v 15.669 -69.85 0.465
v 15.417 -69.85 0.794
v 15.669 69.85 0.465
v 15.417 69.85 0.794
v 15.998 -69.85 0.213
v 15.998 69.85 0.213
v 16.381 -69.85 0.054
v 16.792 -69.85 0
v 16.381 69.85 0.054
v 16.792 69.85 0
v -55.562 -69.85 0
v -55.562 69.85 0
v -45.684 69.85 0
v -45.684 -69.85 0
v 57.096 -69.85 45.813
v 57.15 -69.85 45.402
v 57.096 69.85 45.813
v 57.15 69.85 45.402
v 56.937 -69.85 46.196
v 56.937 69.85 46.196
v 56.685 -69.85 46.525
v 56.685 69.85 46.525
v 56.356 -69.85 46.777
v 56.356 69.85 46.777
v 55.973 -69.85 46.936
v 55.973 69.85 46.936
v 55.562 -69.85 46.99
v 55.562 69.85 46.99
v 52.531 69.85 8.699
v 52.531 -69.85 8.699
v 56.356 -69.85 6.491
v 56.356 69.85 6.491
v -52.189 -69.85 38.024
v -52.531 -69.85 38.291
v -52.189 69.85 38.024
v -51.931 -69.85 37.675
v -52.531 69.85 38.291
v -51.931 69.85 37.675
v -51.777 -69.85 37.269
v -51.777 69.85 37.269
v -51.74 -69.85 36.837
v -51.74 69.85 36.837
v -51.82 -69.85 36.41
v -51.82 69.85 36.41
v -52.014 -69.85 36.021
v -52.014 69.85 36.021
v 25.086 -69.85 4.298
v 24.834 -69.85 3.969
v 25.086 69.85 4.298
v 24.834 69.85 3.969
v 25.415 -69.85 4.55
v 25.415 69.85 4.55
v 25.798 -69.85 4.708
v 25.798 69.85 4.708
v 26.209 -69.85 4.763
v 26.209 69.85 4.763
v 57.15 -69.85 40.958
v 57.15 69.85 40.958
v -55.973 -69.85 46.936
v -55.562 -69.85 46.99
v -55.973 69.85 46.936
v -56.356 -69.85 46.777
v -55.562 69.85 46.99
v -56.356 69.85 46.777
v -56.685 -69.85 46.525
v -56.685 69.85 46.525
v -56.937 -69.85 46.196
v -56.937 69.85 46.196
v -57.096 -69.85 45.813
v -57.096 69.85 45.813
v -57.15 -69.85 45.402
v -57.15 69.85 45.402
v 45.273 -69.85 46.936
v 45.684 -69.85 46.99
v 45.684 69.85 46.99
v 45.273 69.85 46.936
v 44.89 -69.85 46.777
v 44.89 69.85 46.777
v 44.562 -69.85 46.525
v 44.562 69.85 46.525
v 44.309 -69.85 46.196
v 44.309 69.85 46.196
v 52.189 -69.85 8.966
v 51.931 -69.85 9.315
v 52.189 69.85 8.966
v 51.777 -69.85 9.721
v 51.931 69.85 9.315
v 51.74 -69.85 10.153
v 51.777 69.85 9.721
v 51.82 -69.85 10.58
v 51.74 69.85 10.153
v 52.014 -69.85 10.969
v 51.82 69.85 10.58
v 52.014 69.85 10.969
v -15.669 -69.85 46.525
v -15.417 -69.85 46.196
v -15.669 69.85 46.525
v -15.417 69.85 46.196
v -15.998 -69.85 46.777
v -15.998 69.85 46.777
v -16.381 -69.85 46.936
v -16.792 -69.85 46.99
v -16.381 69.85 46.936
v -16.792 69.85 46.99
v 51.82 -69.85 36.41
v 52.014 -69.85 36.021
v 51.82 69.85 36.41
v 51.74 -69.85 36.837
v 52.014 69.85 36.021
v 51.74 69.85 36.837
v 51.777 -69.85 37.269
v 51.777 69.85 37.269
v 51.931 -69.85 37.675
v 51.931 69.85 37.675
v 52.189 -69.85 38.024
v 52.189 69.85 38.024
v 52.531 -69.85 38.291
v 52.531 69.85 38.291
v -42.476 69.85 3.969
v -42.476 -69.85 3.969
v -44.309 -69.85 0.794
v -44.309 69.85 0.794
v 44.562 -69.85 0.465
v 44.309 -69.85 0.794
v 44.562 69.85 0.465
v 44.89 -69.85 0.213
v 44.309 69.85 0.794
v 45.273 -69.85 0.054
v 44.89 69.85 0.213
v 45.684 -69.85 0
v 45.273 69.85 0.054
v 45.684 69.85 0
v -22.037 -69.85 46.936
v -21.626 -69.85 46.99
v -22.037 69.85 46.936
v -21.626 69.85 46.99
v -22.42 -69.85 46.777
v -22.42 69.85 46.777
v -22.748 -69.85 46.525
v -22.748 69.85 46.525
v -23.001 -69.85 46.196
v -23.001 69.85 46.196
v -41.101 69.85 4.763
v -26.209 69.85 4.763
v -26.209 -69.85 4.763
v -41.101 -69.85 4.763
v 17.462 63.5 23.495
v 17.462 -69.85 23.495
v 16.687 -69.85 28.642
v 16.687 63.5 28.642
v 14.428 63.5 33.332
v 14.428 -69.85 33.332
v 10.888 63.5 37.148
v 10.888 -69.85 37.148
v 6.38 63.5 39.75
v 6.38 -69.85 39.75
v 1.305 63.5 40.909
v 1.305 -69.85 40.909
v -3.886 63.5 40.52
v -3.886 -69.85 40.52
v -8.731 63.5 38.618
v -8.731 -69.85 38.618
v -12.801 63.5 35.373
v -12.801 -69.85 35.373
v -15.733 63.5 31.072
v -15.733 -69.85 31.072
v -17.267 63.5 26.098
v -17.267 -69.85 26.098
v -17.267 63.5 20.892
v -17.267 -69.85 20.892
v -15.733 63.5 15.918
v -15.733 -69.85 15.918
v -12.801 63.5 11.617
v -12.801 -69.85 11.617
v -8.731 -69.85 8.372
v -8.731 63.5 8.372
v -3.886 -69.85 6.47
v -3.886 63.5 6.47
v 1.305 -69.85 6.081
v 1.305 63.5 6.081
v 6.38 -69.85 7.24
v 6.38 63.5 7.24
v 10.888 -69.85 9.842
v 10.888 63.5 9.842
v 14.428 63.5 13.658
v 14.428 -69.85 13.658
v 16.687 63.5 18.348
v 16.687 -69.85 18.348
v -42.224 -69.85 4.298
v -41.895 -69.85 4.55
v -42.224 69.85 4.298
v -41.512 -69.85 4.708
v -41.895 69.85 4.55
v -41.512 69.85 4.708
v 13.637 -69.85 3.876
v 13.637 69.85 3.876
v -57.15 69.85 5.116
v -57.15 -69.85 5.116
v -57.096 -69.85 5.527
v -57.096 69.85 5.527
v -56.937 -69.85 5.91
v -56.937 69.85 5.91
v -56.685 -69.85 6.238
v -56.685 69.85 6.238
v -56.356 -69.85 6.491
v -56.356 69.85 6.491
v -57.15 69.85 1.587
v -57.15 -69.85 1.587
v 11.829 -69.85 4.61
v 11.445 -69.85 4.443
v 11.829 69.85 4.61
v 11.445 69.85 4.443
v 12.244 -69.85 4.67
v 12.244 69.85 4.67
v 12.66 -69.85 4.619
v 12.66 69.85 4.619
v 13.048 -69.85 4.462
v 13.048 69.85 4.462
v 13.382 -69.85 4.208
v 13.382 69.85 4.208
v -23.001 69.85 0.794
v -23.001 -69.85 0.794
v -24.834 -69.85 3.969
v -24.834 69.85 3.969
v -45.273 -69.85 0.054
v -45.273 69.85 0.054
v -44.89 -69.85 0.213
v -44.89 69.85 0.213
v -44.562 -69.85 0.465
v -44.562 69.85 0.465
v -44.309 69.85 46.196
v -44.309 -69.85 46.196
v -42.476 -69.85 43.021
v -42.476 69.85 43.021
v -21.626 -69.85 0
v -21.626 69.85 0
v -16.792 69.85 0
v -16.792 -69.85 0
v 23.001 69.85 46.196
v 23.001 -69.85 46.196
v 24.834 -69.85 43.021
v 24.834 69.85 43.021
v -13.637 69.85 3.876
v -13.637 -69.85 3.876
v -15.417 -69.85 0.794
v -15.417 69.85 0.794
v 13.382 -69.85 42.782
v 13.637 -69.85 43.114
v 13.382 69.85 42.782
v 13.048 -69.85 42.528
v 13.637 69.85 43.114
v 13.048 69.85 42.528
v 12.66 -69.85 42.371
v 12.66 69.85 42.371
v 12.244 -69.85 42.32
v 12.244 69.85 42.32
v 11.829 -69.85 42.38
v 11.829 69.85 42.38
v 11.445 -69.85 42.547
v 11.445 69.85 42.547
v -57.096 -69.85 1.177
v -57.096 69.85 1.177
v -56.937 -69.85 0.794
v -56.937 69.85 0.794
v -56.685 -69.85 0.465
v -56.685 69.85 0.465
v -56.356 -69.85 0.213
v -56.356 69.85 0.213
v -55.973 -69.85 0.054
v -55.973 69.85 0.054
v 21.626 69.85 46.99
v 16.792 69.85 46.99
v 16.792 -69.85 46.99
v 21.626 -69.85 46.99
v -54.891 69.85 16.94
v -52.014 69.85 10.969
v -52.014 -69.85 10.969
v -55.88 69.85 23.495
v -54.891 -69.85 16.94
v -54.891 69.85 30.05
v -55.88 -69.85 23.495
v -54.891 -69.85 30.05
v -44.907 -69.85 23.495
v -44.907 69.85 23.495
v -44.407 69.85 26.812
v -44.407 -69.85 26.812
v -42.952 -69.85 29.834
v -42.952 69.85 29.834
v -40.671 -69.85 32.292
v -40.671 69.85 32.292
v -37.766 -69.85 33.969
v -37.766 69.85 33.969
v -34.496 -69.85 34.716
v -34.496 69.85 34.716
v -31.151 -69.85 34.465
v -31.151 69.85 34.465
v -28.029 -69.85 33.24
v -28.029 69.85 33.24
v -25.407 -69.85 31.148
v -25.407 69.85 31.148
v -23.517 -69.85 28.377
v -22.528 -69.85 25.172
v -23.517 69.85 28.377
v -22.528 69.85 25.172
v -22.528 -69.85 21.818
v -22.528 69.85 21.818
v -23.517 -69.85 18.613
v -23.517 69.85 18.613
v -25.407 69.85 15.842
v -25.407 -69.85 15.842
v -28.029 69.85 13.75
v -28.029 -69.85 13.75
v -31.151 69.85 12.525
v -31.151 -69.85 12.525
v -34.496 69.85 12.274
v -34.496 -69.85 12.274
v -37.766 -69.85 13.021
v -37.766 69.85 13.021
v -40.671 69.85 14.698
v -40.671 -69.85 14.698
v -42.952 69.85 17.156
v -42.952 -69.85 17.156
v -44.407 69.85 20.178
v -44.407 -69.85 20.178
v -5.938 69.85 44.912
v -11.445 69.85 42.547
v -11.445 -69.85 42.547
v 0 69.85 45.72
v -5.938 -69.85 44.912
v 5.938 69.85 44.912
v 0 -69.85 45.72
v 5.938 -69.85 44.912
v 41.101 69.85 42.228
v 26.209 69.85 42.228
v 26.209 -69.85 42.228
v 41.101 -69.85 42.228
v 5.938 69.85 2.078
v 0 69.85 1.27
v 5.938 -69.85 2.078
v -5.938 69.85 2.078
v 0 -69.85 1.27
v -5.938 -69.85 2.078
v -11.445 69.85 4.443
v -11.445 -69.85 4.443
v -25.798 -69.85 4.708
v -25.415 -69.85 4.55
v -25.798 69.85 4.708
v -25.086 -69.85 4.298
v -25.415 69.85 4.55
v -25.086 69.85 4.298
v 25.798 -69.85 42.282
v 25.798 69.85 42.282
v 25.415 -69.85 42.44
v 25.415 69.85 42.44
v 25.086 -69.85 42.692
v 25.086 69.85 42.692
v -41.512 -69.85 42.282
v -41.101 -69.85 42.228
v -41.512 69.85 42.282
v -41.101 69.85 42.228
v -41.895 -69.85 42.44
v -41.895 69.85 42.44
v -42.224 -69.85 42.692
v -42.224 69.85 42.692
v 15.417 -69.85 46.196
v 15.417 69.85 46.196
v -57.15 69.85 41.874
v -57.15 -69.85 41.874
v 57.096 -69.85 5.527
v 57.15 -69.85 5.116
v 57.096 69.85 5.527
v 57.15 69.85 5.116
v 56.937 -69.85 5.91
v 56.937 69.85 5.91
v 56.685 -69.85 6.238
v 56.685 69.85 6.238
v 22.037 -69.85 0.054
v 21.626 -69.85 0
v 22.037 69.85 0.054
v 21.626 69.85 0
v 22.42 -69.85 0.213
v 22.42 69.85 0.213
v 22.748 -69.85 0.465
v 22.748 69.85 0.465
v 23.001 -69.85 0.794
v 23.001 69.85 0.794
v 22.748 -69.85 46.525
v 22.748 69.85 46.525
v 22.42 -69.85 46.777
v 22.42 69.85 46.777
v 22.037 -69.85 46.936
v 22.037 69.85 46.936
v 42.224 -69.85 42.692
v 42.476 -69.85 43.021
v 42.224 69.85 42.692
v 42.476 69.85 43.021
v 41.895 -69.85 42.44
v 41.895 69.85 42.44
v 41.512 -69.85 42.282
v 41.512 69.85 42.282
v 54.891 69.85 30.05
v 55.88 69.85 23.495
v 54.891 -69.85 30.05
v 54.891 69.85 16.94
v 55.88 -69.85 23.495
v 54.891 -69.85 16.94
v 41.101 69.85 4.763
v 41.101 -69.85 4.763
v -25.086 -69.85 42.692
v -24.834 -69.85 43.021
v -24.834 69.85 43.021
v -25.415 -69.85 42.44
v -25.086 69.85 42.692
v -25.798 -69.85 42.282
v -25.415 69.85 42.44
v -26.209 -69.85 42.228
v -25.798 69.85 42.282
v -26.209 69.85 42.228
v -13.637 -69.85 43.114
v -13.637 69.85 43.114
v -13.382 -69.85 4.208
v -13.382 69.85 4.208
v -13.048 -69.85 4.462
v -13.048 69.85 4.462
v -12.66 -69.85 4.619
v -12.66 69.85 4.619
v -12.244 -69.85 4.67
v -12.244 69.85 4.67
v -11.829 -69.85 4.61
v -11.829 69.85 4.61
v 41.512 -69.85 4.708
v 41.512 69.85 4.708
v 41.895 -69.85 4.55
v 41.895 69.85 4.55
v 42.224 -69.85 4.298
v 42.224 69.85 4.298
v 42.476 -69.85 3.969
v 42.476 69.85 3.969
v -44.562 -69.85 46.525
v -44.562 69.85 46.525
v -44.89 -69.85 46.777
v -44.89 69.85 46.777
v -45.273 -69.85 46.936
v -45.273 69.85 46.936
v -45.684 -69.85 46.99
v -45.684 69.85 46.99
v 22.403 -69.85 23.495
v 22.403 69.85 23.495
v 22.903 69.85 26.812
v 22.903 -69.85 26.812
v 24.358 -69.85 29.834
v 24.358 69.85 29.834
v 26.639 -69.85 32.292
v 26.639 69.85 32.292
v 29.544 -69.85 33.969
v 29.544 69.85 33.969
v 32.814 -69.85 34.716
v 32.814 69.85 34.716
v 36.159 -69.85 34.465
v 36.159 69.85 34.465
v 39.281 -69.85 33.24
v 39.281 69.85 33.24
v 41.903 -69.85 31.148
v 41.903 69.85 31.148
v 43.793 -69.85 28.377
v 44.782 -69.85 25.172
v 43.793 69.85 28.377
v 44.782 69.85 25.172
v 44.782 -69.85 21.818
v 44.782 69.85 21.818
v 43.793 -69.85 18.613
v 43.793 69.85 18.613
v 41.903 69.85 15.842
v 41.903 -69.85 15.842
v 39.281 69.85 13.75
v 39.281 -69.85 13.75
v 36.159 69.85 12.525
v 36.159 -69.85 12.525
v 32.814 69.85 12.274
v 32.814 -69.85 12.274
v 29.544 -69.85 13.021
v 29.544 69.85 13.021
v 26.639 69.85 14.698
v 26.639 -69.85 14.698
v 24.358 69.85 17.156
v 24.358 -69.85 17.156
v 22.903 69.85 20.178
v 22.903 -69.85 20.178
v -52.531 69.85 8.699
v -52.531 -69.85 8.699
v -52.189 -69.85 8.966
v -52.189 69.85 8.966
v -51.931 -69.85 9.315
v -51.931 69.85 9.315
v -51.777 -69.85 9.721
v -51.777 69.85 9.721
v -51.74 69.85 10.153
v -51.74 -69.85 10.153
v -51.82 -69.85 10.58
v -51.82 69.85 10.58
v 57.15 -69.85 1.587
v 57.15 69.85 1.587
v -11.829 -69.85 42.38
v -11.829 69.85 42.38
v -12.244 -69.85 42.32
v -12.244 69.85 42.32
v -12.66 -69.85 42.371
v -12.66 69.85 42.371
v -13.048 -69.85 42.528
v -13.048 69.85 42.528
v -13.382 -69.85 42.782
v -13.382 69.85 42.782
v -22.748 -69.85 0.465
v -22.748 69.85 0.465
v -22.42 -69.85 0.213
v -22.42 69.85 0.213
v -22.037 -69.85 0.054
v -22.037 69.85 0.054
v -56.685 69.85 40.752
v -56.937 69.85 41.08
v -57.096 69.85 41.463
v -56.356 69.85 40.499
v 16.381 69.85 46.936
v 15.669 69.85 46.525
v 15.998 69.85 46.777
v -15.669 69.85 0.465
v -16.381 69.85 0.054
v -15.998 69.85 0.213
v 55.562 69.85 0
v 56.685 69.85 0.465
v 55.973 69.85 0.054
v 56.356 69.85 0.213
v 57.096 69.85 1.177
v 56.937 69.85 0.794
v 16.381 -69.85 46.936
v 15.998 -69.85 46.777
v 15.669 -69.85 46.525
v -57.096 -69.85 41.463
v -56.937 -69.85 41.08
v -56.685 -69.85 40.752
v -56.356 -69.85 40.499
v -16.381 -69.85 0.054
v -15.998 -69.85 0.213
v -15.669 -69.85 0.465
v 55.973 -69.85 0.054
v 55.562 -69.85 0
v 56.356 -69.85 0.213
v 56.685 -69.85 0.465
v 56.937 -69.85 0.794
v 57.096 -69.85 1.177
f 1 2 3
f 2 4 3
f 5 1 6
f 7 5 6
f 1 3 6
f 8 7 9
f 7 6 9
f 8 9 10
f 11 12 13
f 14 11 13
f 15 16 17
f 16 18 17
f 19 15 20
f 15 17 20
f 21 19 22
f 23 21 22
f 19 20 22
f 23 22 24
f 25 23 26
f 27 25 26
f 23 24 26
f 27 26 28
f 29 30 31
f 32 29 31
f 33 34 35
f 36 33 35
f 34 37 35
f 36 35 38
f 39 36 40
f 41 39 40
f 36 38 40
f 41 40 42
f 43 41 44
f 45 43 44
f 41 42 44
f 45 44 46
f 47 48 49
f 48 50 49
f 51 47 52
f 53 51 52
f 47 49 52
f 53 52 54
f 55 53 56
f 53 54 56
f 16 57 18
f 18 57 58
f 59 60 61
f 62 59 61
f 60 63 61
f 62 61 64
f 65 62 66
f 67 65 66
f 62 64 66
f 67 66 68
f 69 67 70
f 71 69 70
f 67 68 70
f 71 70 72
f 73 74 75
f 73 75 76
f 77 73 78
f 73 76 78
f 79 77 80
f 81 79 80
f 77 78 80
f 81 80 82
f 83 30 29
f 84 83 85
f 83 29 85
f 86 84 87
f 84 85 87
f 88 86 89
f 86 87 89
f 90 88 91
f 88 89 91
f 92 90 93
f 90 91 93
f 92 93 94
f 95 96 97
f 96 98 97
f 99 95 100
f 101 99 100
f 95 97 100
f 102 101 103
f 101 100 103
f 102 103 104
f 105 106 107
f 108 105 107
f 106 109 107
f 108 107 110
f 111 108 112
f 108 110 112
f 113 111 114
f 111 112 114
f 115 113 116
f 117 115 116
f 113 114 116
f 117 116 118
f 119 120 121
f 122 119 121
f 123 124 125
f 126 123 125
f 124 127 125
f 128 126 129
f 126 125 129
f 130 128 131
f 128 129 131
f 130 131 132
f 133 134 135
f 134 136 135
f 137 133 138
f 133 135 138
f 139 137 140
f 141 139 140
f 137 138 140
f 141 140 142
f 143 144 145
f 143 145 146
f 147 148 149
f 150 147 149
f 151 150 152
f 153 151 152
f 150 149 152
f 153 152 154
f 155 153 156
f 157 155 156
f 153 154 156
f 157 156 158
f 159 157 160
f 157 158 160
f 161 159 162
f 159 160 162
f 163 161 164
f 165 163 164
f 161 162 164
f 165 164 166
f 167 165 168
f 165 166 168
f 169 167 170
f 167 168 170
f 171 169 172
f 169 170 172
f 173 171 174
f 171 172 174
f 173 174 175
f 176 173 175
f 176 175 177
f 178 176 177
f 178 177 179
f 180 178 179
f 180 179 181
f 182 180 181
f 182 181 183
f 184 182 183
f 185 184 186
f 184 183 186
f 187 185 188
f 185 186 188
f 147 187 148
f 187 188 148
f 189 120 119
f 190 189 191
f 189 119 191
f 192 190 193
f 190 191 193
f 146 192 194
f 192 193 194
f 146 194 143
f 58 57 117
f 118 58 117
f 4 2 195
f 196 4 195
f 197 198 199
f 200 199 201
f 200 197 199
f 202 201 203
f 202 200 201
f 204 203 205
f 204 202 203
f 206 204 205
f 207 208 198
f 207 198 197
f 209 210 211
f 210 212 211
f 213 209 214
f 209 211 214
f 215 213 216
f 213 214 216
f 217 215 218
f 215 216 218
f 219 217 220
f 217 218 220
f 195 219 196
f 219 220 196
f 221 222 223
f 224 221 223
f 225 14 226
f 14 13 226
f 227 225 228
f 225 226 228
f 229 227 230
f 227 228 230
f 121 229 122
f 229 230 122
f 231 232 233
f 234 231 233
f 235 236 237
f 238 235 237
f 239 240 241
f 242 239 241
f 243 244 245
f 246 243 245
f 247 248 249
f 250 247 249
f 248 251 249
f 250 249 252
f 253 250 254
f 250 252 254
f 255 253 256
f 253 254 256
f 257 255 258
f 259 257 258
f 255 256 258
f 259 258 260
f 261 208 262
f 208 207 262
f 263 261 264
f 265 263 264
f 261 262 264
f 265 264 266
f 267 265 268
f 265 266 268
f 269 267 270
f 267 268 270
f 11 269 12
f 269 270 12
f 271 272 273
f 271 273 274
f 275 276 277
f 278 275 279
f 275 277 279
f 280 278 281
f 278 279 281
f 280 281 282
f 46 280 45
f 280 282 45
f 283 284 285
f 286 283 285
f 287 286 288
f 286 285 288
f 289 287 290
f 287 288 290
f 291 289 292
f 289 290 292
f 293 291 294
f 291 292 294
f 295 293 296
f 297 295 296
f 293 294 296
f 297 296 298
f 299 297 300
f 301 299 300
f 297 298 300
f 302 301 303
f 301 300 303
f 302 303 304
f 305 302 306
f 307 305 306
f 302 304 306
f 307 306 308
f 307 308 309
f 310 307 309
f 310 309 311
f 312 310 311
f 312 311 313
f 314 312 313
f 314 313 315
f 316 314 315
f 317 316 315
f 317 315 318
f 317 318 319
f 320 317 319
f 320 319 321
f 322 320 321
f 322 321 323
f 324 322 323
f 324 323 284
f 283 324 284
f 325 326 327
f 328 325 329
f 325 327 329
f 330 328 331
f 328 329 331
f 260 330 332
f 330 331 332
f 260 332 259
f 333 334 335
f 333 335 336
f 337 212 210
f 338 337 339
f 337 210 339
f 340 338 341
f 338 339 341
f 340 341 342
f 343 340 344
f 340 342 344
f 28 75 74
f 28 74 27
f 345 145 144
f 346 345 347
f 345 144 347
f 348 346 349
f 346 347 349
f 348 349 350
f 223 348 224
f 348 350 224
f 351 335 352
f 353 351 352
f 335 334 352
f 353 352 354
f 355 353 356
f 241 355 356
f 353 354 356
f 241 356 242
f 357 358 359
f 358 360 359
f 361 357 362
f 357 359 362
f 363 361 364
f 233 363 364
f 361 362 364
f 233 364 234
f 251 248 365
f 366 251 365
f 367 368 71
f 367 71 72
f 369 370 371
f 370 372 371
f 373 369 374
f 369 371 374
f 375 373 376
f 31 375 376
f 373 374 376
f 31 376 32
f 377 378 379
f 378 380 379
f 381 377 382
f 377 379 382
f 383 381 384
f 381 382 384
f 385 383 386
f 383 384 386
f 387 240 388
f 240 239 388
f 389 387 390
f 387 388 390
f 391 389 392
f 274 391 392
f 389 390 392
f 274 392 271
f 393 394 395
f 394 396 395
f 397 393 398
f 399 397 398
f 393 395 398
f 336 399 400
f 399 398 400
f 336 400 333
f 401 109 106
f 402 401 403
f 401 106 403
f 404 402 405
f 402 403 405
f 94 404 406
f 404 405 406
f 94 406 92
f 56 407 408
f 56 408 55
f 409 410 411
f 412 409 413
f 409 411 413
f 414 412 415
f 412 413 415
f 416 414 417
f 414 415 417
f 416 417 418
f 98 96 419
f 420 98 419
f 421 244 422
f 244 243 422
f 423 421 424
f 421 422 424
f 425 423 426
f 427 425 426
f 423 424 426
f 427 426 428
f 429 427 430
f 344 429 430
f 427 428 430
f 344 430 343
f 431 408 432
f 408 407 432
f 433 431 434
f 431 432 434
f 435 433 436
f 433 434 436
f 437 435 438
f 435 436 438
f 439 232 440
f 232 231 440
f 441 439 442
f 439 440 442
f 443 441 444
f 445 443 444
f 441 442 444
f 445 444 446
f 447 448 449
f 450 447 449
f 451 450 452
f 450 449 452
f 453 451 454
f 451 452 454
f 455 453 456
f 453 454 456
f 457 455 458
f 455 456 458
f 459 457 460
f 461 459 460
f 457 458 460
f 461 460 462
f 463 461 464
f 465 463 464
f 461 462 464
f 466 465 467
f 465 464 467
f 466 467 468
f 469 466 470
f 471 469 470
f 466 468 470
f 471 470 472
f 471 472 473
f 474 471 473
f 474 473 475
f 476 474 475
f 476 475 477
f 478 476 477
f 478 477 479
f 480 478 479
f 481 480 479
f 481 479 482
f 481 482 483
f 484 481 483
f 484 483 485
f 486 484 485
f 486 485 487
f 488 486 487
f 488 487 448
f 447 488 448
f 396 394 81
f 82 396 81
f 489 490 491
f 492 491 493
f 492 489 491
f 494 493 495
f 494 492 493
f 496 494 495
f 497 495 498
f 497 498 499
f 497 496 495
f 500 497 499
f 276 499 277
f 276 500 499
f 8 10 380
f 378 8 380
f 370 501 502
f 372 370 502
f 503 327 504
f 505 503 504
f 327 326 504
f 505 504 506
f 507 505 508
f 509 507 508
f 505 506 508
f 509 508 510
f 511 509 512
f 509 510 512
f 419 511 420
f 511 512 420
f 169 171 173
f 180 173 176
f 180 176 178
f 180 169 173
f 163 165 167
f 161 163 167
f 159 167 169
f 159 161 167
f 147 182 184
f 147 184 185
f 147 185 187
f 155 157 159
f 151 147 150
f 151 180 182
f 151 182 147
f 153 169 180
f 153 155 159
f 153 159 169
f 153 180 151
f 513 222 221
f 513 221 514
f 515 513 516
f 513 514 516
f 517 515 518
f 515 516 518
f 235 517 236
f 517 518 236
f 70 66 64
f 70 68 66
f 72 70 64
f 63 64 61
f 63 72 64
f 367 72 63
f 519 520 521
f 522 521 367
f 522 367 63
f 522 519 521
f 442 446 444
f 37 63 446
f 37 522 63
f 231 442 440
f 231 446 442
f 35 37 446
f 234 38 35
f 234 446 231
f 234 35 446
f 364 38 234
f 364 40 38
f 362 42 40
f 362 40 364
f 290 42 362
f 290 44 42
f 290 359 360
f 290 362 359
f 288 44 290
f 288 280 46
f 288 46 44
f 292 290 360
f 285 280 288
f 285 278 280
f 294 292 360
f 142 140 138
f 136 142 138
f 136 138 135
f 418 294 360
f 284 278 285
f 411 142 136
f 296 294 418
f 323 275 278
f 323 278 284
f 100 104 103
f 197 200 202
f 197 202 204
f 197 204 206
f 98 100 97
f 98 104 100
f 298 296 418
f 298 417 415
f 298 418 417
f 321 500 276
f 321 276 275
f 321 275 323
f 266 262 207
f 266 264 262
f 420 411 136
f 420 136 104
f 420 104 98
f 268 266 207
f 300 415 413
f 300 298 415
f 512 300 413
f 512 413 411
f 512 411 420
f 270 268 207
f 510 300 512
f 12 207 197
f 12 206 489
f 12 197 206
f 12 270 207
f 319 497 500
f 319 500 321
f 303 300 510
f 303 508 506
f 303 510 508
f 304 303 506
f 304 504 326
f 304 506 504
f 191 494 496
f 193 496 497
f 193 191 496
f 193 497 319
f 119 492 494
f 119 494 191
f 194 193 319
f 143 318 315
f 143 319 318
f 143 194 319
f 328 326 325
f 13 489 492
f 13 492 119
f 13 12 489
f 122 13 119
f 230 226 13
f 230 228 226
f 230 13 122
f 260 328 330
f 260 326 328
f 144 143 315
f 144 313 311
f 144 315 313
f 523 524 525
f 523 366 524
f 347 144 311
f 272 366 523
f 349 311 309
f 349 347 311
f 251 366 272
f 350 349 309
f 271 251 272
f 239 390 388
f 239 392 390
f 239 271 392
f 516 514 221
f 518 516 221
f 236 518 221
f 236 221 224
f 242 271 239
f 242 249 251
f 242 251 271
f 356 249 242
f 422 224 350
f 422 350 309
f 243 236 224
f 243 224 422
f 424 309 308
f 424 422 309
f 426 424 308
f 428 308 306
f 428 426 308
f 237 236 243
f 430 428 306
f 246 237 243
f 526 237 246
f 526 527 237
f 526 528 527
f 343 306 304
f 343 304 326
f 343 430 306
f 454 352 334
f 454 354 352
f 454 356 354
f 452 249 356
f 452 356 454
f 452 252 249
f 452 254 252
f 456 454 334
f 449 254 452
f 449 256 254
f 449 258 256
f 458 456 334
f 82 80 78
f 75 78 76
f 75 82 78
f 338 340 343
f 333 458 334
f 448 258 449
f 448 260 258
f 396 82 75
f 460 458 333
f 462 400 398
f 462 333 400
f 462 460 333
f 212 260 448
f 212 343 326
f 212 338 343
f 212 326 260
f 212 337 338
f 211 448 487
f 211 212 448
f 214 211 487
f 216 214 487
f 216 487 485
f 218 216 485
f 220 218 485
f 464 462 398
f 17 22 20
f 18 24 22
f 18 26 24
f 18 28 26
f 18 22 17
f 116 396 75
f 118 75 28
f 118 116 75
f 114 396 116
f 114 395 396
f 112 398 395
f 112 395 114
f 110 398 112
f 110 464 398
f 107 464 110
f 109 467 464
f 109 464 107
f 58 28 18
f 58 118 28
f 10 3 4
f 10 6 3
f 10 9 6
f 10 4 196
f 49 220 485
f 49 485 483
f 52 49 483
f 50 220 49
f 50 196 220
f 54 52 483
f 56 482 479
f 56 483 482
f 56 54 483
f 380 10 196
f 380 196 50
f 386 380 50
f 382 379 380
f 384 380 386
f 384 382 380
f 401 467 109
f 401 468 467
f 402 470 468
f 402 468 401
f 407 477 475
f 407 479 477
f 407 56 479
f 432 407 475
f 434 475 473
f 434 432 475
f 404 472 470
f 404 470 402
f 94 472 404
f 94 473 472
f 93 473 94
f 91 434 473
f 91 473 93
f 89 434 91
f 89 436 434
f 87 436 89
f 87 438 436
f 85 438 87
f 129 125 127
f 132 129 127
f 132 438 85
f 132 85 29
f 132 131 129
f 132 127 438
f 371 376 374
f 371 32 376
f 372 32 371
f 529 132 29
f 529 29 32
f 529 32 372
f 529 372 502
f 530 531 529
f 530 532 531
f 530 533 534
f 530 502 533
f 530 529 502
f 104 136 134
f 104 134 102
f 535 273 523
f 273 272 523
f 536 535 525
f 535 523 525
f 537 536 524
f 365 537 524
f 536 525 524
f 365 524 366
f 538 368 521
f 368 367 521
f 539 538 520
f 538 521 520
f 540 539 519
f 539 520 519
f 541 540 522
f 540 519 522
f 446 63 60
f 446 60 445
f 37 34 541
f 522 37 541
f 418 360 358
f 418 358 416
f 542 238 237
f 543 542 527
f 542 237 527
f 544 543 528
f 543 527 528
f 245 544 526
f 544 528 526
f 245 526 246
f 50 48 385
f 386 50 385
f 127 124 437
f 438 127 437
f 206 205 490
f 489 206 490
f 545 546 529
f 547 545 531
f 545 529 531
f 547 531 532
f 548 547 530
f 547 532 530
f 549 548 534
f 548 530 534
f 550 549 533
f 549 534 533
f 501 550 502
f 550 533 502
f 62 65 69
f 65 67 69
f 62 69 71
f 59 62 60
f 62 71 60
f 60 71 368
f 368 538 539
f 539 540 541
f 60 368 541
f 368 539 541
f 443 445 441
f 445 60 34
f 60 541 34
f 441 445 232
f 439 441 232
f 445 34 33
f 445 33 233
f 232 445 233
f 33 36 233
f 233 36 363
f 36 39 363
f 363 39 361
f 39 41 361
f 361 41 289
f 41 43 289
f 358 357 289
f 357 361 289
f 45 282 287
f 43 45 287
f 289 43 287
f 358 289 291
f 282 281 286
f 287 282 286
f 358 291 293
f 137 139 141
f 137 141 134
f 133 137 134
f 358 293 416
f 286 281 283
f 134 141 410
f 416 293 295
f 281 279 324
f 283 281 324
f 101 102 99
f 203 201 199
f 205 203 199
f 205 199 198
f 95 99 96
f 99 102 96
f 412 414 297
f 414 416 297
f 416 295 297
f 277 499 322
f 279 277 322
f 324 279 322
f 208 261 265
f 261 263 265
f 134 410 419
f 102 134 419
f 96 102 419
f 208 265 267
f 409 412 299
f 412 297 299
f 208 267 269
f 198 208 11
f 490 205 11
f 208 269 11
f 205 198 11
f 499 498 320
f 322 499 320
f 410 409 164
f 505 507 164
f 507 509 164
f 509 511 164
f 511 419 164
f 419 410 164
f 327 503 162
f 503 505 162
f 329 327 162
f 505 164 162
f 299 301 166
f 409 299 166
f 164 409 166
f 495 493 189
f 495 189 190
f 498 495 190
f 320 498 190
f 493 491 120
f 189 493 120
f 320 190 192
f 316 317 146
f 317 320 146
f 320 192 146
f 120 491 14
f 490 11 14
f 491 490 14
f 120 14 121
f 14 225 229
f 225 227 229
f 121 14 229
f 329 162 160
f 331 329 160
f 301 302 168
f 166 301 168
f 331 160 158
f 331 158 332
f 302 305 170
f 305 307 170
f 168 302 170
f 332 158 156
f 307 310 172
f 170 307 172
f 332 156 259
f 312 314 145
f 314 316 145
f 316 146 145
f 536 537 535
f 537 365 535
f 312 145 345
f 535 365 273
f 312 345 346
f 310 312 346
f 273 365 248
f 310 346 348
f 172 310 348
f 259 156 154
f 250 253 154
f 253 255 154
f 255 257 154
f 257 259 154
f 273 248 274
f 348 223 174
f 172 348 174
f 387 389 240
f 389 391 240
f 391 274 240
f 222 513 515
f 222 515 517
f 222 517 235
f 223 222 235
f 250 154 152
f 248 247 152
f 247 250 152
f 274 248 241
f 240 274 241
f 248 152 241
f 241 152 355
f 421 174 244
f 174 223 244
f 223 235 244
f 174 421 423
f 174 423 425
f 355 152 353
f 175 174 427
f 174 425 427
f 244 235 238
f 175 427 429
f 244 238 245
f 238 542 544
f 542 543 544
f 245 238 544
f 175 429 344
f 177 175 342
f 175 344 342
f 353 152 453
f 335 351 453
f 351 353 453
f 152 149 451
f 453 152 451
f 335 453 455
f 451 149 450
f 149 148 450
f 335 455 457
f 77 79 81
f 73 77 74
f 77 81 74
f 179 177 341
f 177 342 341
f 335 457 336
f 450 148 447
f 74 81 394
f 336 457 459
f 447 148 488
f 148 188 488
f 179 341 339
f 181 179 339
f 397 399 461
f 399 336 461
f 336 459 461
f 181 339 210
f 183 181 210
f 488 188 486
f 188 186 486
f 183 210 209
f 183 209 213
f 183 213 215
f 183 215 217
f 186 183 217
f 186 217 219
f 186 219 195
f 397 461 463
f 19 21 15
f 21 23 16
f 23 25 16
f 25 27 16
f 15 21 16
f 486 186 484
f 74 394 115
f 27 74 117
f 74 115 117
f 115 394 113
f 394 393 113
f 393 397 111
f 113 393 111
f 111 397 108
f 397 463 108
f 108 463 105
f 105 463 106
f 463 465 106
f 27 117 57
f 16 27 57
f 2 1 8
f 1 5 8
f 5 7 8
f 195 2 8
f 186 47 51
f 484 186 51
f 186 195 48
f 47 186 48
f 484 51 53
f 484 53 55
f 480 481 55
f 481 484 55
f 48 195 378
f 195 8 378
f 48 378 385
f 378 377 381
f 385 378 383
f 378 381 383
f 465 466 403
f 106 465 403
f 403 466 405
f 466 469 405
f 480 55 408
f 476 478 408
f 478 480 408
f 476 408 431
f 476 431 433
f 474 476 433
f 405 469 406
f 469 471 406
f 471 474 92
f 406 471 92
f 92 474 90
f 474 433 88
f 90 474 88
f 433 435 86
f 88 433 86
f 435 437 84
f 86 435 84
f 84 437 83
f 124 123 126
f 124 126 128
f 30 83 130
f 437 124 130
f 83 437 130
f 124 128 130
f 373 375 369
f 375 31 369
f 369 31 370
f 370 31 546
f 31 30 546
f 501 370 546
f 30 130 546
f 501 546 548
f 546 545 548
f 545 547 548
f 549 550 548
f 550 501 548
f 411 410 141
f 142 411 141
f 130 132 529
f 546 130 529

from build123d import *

# Parameters (mm, degrees)
F0_W     = 114.3
F0_H     = 139.7
F1_DEPTH = 46.99
F3_D     = 22.5044
F4_R     = 17.4625
F5_DEPTH = 133.35
F7_DEPTH = 139.701
F8_R     = 1.5875


with BuildPart() as f1:
    # F0 (on Top) → F1 (new body)
    with BuildSketch(Plane.XY):
        Rectangle(F0_W, F0_H)
    extrude(amount=F1_DEPTH)

    # F3 (through all)
    with Locations(Plane.XZ.offset(69.85)):
        with Locations((-33.655, 23.495), (33.655, 23.495)):
            Hole(F3_D / 2)

    # F4 (on face) → F5 (cut, through all)
    with BuildSketch(Plane.XZ.offset(69.85)):
        with Locations((0, 23.495)):
            Circle(F4_R)
    extrude(amount=-F5_DEPTH, mode=Mode.SUBTRACT)

    # F6 (on face) → F7 (cut, through all)
    with BuildSketch(Plane.XZ.offset(69.85)):
        with BuildLine():
            Line((-50.9913984587, 37.4018297423), (-57.15, 40.9575))
            Line((-57.15, 40.9575), (-57.15, 6.0325))
            Line((-57.15, 6.0325), (-50.9913984587, 9.5881702577))
            ThreePointArc((-50.9913984587, 9.5881702577), (-55.88, 23.495), (-50.9913984587, 37.4018297423))
        make_face()
        Polygon((-22.5425, 46.99), (-44.7675, 46.99), (-42.017869343, 42.2275), (-25.292130657, 42.2275), align=None)
        Polygon((-42.017869343, 4.7625), (-44.7675, 0), (-22.5425, 0), (-25.292130657, 4.7625), align=None)
        with BuildLine():
            Line((-12.800001213, 5.3260541322), (-15.875, 0))
            Line((-15.875, 0), (15.875, 0))
            Line((15.875, 0), (12.800001213, 5.3260541322))
            ThreePointArc((12.800001213, 5.3260541322), (0, 1.27), (-12.800001213, 5.3260541322))
        make_face()
        with BuildLine():
            Line((15.875, 46.99), (-15.875, 46.99))
            Line((-15.875, 46.99), (-12.800001213, 41.6639458678))
            ThreePointArc((-12.800001213, 41.6639458678), (0, 45.72), (12.800001213, 41.6639458678))
            Line((12.800001213, 41.6639458678), (15.875, 46.99))
        make_face()
        Polygon((44.7675, 46.99), (22.5425, 46.99), (25.292130657, 42.2275), (42.017869343, 42.2275), align=None)
        Polygon((25.292130657, 4.7625), (22.5425, 0), (44.7675, 0), (42.017869343, 4.7625), align=None)
        with BuildLine():
            Line((57.15, 6.0325), (57.15, 40.9575))
            Line((57.15, 40.9575), (50.9913984587, 37.4018297423))
            ThreePointArc((50.9913984587, 37.4018297423), (55.88, 23.495), (50.9913984587, 9.5881702577))
            Line((50.9913984587, 9.5881702577), (57.15, 6.0325))
        make_face()
    extrude(amount=-F7_DEPTH, mode=Mode.SUBTRACT)

    # F8
    f8_edges = [f1.edges().sort_by_distance(p)[0] for p in [
        (-57.15, 0, 0),
        (-44.7675, 0, 0),
        (-42.017869, 0, 4.7625),
        (-25.292131, 0, 4.7625),
        (-22.5425, 0, 0),
        (-15.875, 0, 0),
        (-12.800001, 0, 5.326054),
        (12.800001, 0, 5.326054),
        (15.875, 0, 0),
        (22.5425, 0, 0),
        (25.292131, 0, 4.7625),
        (42.017869, 0, 4.7625),
        (44.7675, 0, 0),
        (57.15, 0, 0),
        (57.15, 0, 6.0325),
        (50.991398, 0, 37.40183),
        (50.991398, 0, 9.58817),
        (57.15, 0, 46.99),
        (44.7675, 0, 46.99),
        (42.017869, 0, 42.2275),
        (25.292131, 0, 42.2275),
        (22.5425, 0, 46.99),
        (15.875, 0, 46.99),
        (12.800001, 0, 41.663946),
        (-12.800001, 0, 41.663946),
        (-15.875, 0, 46.99),
        (-22.5425, 0, 46.99),
        (-25.292131, 0, 42.2275),
        (-42.017869, 0, 42.2275),
        (-44.7675, 0, 46.99),
        (-57.15, 0, 46.99),
        (-57.15, 0, 40.9575),
        (-50.991398, 0, 37.40183),
        (-50.991398, 0, 9.58817),
        (-57.15, 0, 6.0325),
    ]]
    fillet(f8_edges, radius=F8_R)


solid = f1.part
